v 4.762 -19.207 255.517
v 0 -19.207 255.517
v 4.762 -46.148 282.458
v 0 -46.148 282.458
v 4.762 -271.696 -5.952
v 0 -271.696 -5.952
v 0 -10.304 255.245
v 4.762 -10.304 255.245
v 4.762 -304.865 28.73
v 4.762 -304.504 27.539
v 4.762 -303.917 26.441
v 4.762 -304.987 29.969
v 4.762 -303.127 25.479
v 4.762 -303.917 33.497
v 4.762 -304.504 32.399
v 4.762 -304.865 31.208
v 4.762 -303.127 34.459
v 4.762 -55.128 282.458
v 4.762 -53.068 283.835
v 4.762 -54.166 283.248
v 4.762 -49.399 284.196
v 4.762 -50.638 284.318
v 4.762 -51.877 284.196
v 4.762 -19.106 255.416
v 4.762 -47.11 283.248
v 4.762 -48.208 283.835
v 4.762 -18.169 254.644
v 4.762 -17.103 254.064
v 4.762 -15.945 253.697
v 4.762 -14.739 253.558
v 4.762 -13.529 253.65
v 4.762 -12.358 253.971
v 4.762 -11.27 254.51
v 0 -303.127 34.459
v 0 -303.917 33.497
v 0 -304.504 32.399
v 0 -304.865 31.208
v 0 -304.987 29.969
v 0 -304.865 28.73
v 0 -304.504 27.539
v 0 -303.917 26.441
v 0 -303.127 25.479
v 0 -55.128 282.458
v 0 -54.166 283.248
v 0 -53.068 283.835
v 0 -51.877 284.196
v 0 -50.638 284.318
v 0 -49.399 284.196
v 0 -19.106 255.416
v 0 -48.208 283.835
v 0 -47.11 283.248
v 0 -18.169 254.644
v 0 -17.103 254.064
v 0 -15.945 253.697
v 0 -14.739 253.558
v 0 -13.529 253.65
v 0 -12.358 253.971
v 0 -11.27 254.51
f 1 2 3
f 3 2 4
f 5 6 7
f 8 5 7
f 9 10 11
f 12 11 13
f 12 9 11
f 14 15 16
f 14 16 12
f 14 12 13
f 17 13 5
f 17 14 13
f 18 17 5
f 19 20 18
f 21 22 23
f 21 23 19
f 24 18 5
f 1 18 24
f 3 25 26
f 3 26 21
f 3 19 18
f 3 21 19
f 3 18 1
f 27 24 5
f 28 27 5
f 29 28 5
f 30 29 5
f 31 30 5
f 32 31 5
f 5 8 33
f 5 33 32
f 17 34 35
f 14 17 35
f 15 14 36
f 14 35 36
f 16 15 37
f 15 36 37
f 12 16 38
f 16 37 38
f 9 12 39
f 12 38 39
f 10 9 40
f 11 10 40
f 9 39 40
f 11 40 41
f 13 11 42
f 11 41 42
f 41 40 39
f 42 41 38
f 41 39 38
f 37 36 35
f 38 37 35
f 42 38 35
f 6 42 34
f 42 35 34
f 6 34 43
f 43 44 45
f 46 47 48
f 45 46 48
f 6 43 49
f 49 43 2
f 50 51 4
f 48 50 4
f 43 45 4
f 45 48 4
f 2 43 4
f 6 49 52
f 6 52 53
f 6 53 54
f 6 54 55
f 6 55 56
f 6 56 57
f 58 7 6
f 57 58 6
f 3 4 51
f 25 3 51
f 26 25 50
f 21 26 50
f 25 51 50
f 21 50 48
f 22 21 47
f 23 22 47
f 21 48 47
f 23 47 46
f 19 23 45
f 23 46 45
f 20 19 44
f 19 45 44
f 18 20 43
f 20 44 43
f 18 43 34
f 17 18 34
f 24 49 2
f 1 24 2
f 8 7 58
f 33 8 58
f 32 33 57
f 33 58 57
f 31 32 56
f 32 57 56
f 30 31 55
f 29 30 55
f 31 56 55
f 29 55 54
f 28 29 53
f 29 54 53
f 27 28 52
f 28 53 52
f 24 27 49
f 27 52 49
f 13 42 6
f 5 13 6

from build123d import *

# Parameters (mm, degrees)
F1_DEPTH = 4.7625


# Not quite as in the source:
# - ends of sketch curves that miss each other by under 0.0002 mm in the source are joined


with BuildPart() as f1:
    # F0 (on Right) → F1 (new body)
    with BuildSketch(Plane.YZ):
        with BuildLine():
            ThreePointArc((-10.3035716562, 255.2451451351), (-14.739191866, 253.5576398603), (-19.1058595605, 255.4162990395))
            Line((-19.1058595605, 255.4162990395), (-19.2069466, 255.517396))
            Line((-19.2069466, 255.517396), (-46.1477106, 282.45816))
            ThreePointArc((-46.1477106, 282.45816), (-50.6378374197, 284.3180242), (-55.1279617605, 282.4581649605))
            Line((-55.1279617605, 282.4581649605), (-303.1270036, 34.4591132))
            ThreePointArc((-303.1270036, 34.4591132), (-304.9868678, 29.9689938197), (-303.1269958605, 25.4788747395))
            Line((-303.1269958605, 25.4788747395), (-271.6961038, -5.9520328))
            Line((-271.6961038, -5.9520328), (-10.3035716562, 255.2451451351))
        make_face()
    extrude(amount=F1_DEPTH)


solid = f1.part
